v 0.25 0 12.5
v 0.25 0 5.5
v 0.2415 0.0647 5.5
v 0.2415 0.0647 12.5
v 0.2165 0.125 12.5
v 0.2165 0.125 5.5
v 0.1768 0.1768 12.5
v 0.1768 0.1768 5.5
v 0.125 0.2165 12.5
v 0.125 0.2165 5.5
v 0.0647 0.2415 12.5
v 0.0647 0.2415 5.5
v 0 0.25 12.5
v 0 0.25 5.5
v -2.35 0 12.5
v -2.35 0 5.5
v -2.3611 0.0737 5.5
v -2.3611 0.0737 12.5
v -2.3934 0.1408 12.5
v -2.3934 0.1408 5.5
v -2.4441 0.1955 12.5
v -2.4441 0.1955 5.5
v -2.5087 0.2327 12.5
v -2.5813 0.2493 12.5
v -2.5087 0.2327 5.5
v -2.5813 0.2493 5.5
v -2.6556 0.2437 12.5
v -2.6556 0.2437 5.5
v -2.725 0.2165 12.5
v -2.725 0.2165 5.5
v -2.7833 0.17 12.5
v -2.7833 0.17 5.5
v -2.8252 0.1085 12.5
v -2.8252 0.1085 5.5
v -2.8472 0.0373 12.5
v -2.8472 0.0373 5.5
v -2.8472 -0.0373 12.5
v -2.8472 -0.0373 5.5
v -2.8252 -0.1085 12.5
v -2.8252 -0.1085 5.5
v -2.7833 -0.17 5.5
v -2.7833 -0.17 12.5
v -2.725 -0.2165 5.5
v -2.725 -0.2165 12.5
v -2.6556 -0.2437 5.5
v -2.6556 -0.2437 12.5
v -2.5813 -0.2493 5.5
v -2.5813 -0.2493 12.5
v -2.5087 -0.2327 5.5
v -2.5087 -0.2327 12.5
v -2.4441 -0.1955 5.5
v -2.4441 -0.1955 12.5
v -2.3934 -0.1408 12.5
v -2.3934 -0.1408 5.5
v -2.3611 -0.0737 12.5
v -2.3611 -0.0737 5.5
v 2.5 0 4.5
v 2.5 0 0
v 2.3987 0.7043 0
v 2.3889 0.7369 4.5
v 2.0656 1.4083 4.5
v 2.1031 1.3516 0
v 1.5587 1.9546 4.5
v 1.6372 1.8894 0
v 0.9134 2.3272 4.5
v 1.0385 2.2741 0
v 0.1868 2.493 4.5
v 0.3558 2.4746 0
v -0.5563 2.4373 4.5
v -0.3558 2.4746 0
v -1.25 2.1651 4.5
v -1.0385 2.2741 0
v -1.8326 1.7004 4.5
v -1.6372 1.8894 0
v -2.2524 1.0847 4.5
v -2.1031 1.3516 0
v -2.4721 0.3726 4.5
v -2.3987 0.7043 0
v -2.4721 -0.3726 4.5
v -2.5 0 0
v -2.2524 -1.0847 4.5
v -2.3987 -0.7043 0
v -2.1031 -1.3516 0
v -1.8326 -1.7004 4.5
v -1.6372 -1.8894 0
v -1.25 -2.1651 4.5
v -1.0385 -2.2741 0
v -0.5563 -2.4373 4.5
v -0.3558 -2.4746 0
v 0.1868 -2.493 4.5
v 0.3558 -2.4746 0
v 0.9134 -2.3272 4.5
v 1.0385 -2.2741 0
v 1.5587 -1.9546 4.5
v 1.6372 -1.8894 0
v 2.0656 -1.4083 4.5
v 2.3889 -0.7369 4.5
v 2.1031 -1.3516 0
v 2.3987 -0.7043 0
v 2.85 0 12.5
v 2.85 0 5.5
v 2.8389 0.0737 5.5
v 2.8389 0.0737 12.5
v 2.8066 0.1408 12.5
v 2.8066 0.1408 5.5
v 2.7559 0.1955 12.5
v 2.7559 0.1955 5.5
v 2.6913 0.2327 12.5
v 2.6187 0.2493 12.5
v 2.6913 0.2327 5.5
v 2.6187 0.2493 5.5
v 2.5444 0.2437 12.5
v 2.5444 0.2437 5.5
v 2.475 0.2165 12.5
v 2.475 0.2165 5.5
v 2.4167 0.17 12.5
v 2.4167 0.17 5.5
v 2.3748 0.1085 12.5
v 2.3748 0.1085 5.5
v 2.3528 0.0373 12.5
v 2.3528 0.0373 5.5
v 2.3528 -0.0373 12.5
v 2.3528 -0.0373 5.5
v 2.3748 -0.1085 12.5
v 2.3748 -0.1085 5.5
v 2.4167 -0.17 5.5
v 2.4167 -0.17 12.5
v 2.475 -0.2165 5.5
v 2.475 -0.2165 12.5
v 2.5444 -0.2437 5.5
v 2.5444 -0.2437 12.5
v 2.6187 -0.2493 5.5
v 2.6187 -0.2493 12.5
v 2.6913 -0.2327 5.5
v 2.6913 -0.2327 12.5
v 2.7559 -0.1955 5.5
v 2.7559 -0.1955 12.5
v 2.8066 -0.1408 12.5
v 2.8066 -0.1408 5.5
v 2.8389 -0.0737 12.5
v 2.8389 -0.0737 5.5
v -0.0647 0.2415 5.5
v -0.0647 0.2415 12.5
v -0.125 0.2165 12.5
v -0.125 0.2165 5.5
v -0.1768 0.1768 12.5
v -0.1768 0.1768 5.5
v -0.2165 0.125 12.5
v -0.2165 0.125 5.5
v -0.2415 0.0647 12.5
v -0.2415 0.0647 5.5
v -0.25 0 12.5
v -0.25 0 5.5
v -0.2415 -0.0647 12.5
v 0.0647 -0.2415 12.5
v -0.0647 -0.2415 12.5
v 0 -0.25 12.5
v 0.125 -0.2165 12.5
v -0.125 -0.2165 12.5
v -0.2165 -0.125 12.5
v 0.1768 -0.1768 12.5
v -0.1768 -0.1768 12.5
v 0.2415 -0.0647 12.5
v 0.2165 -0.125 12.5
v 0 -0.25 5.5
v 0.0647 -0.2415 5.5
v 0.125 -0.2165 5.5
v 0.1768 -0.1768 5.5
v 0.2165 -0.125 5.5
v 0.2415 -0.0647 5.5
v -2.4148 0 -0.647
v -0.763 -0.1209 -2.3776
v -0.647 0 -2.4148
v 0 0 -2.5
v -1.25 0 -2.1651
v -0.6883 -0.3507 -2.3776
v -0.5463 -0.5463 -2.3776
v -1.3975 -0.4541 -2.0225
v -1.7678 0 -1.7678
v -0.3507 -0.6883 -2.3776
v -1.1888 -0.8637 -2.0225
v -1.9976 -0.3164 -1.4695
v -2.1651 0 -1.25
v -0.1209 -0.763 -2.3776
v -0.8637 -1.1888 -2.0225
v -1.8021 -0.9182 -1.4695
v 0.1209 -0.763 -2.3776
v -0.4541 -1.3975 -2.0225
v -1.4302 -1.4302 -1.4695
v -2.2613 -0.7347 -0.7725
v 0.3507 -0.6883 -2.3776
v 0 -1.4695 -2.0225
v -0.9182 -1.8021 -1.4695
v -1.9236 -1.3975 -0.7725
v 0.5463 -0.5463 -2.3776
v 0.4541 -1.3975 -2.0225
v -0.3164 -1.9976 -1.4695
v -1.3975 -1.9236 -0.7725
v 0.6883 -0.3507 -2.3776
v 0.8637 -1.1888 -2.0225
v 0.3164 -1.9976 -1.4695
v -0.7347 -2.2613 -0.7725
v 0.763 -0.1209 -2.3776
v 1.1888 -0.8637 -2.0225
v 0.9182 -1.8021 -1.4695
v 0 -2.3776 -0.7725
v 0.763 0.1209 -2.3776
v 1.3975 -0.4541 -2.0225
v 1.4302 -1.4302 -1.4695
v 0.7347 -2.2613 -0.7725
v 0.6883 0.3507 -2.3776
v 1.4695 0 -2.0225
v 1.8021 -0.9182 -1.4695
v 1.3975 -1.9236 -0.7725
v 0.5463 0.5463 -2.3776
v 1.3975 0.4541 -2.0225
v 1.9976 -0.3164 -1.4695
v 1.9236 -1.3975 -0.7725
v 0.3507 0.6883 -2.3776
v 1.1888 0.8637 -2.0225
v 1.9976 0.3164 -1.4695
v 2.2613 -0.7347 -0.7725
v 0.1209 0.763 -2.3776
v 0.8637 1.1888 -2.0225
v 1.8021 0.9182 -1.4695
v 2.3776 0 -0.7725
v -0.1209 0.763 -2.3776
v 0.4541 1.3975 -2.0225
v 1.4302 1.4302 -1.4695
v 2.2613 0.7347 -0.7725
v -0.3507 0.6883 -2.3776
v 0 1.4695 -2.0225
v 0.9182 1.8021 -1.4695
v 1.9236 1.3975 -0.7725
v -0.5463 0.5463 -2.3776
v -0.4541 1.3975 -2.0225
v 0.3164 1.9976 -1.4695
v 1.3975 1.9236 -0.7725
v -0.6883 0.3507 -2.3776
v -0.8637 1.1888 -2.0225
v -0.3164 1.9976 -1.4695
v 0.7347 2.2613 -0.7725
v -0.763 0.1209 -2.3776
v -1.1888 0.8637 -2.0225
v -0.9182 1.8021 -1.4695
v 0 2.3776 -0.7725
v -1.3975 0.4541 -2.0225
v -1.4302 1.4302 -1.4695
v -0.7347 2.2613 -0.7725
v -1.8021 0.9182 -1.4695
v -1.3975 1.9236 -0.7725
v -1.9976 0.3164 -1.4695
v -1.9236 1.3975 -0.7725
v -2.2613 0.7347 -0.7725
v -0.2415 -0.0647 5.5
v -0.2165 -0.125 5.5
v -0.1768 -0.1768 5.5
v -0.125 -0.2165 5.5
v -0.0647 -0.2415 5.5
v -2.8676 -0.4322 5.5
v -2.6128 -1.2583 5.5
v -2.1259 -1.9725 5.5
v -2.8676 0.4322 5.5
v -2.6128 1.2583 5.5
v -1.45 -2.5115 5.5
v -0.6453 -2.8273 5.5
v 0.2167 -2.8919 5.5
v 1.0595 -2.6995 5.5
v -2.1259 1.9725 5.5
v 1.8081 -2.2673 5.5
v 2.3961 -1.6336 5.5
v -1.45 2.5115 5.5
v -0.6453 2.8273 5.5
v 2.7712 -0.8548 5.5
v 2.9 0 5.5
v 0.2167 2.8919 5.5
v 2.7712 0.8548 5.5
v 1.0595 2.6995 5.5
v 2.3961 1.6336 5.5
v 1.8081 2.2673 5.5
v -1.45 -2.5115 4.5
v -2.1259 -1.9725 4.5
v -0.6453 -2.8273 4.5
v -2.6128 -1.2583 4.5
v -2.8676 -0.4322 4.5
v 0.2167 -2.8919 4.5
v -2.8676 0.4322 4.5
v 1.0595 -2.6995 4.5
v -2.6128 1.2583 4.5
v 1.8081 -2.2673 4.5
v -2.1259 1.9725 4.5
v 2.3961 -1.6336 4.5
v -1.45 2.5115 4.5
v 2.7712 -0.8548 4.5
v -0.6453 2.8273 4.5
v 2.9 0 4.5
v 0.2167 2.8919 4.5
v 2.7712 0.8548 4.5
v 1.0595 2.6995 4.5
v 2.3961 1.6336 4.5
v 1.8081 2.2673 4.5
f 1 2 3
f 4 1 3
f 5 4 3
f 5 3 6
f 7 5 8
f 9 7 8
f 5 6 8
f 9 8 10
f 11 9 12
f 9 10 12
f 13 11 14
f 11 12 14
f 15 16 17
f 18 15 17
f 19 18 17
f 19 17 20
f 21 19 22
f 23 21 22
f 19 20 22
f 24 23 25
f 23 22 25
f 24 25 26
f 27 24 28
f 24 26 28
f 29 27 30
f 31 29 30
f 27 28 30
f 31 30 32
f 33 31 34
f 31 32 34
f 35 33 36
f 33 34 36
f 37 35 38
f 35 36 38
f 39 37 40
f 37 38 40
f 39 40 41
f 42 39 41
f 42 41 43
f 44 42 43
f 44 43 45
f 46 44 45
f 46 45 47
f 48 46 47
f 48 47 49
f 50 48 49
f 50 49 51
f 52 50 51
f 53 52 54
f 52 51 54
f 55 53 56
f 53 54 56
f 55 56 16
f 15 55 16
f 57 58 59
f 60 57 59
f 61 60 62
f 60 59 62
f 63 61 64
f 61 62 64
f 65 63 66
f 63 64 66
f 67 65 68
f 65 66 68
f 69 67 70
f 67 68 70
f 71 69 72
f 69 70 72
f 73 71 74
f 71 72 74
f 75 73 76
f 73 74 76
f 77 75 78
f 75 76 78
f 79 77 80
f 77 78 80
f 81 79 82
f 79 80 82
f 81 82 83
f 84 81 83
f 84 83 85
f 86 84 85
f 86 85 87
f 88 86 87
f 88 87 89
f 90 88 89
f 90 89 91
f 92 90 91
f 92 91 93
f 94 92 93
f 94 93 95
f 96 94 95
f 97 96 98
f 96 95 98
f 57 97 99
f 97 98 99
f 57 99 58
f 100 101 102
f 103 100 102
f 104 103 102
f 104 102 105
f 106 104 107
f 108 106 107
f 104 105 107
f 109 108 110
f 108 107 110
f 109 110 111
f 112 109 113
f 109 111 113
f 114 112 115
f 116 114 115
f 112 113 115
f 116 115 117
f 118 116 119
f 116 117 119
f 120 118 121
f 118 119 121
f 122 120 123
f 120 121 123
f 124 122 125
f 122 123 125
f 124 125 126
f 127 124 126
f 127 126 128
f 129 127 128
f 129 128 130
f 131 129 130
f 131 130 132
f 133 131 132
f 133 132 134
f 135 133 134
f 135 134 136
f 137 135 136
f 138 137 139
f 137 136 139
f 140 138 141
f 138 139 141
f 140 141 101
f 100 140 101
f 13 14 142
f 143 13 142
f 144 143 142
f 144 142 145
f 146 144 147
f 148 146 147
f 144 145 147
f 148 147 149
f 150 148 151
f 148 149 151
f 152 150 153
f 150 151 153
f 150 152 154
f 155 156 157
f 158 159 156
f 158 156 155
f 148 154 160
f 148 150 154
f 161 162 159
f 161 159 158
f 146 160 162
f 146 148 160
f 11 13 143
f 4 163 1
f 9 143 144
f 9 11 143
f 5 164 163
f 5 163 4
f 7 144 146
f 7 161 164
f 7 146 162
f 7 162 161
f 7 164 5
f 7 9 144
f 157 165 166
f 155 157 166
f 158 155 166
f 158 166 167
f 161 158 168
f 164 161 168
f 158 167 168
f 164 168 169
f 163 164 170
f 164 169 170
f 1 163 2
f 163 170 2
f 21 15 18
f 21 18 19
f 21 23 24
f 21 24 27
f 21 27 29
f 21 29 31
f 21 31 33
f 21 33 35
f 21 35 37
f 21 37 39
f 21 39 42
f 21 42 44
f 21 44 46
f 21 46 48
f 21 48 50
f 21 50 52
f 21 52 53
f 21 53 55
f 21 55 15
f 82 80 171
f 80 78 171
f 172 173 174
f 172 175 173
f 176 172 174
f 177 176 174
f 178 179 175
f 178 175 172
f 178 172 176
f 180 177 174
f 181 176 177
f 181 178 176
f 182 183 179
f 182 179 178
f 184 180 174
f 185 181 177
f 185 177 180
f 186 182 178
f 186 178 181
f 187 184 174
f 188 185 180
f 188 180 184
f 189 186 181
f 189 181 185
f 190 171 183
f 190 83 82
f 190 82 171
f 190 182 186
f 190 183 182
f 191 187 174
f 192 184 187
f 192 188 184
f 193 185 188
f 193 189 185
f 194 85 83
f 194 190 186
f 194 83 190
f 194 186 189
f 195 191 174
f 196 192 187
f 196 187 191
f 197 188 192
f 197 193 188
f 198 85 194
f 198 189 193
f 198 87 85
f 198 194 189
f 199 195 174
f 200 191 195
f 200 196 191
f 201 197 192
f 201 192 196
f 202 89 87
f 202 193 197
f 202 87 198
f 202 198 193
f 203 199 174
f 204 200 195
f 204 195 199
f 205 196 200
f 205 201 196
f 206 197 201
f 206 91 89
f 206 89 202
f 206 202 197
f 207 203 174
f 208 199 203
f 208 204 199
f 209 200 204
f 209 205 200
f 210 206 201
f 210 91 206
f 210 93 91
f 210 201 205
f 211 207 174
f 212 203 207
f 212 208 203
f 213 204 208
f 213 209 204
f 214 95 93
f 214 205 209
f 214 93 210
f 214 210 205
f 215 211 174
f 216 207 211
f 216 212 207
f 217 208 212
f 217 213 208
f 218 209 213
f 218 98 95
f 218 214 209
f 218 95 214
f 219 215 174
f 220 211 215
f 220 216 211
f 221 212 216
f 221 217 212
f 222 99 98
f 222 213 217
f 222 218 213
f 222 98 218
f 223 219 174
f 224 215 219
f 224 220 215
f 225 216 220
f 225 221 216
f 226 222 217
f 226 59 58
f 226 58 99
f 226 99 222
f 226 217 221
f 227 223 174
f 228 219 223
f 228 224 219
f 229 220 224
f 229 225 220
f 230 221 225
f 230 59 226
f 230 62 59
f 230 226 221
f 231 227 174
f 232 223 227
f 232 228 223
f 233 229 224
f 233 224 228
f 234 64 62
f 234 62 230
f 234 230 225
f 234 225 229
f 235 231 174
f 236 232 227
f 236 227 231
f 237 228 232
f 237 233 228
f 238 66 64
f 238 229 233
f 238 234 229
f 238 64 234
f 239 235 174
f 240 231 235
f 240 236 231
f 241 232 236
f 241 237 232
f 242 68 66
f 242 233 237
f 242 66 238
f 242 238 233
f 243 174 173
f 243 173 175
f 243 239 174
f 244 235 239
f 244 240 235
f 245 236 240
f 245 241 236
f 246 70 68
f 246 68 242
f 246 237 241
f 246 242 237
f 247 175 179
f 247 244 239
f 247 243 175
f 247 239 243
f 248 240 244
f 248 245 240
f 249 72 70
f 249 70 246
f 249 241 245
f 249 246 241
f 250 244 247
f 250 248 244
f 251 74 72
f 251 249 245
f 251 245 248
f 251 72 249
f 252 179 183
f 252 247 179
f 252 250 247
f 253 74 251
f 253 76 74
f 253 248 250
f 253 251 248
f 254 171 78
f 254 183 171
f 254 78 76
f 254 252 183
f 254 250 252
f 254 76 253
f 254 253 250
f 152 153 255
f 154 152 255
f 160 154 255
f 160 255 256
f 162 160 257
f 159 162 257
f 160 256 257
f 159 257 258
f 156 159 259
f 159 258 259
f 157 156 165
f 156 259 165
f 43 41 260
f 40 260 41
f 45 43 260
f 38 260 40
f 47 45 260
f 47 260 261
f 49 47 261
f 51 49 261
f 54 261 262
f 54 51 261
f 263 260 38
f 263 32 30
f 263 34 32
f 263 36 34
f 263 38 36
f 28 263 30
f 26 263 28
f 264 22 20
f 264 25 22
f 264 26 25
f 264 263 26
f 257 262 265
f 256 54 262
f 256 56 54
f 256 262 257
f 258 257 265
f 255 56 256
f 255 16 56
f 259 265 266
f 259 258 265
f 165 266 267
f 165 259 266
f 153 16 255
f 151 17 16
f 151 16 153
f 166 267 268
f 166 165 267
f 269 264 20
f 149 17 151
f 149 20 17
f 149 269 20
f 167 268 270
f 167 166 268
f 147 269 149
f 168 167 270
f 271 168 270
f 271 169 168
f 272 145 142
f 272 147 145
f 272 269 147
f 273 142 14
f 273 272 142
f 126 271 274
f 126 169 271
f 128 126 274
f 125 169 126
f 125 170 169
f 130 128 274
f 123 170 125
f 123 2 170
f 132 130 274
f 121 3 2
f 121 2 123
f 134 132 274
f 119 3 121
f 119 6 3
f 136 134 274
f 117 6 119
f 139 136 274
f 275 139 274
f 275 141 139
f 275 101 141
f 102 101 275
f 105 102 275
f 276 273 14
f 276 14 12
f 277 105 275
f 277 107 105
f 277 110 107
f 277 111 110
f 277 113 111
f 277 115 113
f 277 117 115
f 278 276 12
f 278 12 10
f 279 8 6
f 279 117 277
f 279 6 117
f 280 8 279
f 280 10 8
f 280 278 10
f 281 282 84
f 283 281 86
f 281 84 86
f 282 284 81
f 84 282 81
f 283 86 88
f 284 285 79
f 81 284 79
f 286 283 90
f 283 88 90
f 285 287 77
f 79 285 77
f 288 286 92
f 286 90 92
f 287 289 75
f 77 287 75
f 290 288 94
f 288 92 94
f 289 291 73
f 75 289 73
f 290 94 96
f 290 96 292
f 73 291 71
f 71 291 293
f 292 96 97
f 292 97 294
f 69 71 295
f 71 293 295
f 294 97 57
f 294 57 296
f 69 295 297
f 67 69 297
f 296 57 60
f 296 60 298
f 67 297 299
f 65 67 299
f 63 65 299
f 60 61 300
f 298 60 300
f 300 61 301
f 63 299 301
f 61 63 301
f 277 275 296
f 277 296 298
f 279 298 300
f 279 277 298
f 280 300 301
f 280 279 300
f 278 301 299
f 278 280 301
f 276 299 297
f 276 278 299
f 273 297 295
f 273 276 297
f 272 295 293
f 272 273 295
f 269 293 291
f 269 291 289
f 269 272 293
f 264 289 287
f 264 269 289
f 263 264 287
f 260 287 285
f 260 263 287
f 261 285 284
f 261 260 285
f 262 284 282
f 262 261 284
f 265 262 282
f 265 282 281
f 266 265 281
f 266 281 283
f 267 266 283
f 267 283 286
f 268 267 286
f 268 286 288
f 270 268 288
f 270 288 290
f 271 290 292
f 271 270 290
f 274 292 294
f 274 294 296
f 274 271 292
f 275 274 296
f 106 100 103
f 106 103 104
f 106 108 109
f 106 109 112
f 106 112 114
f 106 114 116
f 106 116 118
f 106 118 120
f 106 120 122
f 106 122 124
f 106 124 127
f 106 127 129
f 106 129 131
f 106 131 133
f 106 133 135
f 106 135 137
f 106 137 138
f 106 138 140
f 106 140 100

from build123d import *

# Parameters (mm, degrees)
SKETCH_1_R        = 2.5
EXTRUDE_1_DEPTH   = 5.5
SKETCH_2_R        = 2.9
EXTRUDE_2_DEPTH   = 1
EXTRUDE_1_2_DEPTH = 7


with BuildPart() as part:
    # 草图1 → Extrude 1 (new body)
    with BuildSketch(Plane.XY):
        Circle(SKETCH_1_R)
    extrude(amount=EXTRUDE_1_DEPTH)

    # 草图2 → 拉伸2 (add)
    with BuildSketch(Plane.XY.offset(5.5)):
        Circle(SKETCH_2_R)
    extrude(amount=-EXTRUDE_2_DEPTH)

    # 草图5 → 旋转2 (revolve)
    with BuildSketch(Plane(origin=(0, 0, 0), x_dir=(0, 0, -1), z_dir=(1, 0, 0)), mode=Mode.PRIVATE) as revolve_2_sk:
        with BuildLine():
            Line((0, 2.5), (0, 0))
            Line((0, 0), (2.5, 0))
            ThreePointArc((2.5, 0), (1.767766953, 1.767766953), (0, 2.5))
        make_face()
    revolve(revolve_2_sk.sketch.rotate(Axis((0, 0, -2.5), (0, 0, 1)), 90), axis=Axis((0, 0, -2.5), (0, 0, 1)))

    # 草图6 → Extrude 1 2 (add)
    with BuildSketch(Plane.XY.offset(5.5)):
        with BuildLine():
            ThreePointArc((2.35, 0), (2.6, -0.25), (2.85, 0))
            Line((2.85, 0), (2.35, 0))
        make_face()
        with BuildLine():
            Line((2.35, 0), (2.85, 0))
            ThreePointArc((2.85, 0), (2.6, 0.25), (2.35, 0))
        make_face()
        with BuildLine():
            ThreePointArc((0, -0.25), (0.176776695, -0.176776695), (0.25, 0))
            Line((0.25, 0), (0, 0))
            Line((0, 0), (0, -0.25))
        make_face()
        with BuildLine():
            Line((0, 0), (0.25, 0))
            ThreePointArc((0.25, 0), (0.176776695, 0.176776695), (0, 0.25))
            Line((0, 0.25), (0, 0))
        make_face()
        with BuildLine():
            Line((0, -0.25), (0, 0))
            Line((0, 0), (-0.25, 0))
            ThreePointArc((-0.25, 0), (-0.176776695, -0.176776695), (0, -0.25))
        make_face()
        with BuildLine():
            Line((-0.25, 0), (0, 0))
            Line((0, 0), (0, 0.25))
            ThreePointArc((0, 0.25), (-0.176776695, 0.176776695), (-0.25, 0))
        make_face()
        with BuildLine():
            ThreePointArc((-2.85, 0), (-2.6, -0.25), (-2.35, 0))
            Line((-2.35, 0), (-2.85, 0))
        make_face()
        with BuildLine():
            Line((-2.85, 0), (-2.35, 0))
            ThreePointArc((-2.35, 0), (-2.6, 0.25), (-2.85, 0))
        make_face()
    extrude(amount=EXTRUDE_1_2_DEPTH)


solid = part.part
